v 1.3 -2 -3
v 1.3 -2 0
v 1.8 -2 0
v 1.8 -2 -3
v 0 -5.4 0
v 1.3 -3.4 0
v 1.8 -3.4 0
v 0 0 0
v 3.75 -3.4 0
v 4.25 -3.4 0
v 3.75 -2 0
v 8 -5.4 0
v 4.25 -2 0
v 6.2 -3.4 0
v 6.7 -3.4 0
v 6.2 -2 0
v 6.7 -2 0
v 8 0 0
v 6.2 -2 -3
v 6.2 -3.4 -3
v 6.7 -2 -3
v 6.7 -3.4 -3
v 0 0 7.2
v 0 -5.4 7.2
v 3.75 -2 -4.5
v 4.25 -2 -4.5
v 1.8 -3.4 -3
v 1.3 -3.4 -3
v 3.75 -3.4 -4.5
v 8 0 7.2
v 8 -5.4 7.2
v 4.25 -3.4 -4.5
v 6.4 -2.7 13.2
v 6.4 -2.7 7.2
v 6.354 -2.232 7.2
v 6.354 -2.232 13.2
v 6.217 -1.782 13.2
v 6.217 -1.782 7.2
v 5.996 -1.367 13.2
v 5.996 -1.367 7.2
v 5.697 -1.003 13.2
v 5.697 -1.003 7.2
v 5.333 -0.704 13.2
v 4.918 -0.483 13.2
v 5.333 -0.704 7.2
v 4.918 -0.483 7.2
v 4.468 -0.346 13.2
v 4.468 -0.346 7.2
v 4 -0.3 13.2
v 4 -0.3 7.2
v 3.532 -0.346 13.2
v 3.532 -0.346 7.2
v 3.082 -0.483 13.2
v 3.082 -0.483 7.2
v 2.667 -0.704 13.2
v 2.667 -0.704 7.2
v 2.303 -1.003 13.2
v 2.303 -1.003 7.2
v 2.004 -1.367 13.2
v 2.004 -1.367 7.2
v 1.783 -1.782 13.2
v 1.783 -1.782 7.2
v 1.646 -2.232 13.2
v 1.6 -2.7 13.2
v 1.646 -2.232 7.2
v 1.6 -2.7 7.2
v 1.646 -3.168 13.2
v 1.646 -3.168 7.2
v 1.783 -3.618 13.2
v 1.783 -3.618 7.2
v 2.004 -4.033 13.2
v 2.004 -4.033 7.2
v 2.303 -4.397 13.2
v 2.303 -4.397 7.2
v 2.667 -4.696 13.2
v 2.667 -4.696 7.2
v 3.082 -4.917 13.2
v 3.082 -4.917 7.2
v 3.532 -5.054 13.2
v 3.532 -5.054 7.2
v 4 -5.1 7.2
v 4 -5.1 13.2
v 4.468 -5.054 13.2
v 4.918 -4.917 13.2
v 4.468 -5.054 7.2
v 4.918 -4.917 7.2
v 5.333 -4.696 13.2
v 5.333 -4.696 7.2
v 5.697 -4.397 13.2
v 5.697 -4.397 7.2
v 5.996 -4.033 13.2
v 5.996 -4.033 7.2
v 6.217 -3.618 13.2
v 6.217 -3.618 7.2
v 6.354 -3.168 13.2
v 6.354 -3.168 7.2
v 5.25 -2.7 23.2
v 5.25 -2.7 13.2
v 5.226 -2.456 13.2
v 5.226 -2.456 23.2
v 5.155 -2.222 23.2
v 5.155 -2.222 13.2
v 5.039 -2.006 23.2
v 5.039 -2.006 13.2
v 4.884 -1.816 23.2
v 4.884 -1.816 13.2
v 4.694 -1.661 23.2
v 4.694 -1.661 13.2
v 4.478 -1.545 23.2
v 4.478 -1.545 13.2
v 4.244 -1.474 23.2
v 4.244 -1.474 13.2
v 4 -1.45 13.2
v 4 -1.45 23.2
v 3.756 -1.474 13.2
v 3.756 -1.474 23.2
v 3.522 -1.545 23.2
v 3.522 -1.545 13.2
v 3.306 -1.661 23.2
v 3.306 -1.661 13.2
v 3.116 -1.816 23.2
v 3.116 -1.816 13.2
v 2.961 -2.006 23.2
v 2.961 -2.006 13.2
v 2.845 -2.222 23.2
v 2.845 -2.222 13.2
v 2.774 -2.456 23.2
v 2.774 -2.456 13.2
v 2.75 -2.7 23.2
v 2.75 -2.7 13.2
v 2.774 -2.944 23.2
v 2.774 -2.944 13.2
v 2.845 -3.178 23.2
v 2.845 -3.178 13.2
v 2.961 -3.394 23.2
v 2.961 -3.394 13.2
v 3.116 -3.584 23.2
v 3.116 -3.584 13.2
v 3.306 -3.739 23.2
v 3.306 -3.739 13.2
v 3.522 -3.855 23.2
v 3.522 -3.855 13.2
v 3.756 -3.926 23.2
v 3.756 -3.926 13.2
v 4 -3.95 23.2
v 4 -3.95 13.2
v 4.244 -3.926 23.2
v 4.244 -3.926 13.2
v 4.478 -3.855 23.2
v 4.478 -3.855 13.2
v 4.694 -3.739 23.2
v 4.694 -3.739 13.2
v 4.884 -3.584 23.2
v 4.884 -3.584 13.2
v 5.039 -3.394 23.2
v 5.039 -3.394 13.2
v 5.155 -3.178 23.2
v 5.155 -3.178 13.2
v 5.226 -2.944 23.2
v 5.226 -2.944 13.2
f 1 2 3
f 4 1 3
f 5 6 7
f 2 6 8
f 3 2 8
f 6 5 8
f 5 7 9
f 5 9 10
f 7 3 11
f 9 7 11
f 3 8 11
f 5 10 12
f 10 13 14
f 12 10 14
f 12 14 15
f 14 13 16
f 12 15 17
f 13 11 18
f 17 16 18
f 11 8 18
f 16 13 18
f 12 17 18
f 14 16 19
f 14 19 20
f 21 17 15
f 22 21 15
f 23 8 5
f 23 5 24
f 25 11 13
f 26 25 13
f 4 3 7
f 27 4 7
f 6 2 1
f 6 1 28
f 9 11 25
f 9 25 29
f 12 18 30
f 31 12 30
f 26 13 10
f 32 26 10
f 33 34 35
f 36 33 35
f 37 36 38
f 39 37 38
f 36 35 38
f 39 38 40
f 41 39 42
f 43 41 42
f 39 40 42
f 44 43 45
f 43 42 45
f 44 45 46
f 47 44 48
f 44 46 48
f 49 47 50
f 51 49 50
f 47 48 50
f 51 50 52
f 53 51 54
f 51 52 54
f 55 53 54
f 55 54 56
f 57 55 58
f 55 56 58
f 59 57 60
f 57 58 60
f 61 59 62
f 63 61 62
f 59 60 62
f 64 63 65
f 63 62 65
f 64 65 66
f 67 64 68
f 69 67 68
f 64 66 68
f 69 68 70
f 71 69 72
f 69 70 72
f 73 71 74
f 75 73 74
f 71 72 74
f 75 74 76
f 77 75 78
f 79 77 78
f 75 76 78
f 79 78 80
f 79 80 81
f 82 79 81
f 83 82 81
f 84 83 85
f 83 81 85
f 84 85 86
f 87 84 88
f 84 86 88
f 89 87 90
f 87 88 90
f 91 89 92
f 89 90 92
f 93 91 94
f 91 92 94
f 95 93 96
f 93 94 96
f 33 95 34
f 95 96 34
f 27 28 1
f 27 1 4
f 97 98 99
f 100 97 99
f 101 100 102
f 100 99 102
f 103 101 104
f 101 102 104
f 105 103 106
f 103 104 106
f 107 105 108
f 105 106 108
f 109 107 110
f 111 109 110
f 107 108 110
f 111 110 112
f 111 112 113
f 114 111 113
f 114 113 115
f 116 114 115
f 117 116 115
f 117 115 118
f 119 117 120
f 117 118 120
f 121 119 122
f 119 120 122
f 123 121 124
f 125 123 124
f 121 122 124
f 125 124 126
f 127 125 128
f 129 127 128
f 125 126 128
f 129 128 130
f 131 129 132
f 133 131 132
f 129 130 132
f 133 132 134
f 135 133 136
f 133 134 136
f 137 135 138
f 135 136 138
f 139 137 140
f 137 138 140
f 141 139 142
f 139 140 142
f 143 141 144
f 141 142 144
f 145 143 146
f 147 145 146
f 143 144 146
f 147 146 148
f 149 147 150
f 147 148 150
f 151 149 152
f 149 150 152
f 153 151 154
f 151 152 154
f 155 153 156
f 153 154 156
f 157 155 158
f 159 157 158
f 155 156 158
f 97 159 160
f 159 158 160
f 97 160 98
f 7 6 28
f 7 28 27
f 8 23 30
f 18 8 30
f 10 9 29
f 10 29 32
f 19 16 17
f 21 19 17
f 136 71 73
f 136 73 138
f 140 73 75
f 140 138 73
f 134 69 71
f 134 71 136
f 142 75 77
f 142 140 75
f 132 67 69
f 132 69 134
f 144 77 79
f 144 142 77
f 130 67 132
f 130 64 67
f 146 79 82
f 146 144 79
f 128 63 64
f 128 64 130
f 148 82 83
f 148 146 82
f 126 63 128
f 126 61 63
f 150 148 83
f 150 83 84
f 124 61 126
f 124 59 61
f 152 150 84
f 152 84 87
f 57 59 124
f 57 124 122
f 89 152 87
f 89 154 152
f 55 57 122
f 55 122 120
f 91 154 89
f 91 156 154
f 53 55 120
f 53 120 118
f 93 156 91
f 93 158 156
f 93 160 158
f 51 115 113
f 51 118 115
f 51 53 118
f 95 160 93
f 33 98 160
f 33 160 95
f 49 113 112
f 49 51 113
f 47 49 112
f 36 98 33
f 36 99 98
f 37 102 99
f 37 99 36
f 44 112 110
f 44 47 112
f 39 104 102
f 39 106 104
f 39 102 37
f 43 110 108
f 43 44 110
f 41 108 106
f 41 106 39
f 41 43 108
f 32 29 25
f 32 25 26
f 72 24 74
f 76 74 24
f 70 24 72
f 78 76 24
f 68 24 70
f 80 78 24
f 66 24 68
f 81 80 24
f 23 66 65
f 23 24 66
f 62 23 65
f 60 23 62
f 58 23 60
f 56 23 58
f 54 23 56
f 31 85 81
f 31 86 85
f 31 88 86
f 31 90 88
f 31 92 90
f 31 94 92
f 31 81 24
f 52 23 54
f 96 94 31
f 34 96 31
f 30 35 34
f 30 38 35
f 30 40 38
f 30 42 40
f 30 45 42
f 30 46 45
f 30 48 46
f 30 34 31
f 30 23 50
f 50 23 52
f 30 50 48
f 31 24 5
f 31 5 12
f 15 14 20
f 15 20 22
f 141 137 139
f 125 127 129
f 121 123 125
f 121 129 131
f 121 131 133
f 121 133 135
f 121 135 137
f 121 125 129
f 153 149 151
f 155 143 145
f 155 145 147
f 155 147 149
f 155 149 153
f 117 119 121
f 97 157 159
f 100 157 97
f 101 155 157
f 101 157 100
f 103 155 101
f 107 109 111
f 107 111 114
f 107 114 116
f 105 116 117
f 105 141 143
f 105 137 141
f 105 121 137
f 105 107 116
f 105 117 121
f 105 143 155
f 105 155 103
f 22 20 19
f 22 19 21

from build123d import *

# Parameters (mm, degrees)
F0_W     = 8
F0_H     = 7.2
F1_DEPTH = 5.4
F2_R     = 2.4
F3_DEPTH = 6
F4_R     = 1.25
F5_DEPTH = 10
F6_W     = 0.5
F6_H     = 1.4
F7_DEPTH = 3
F8_W     = 0.5
F8_H     = 1.4
F9_DEPTH = 4.5


with BuildPart() as f1:
    # F0 (on Front) → F1 (new body)
    with BuildSketch(Plane.XZ):
        with Locations((4, 3.6)):
            Rectangle(F0_W, F0_H)
    extrude(amount=F1_DEPTH)

    # F2 (on face) → F3 (join)
    with BuildSketch(Plane.XY.offset(7.2)):
        with Locations((4, -2.7)):
            Circle(F2_R)
    extrude(amount=F3_DEPTH)

    # F4 (on face) → F5 (join)
    with BuildSketch(Plane.XY.offset(13.2)):
        with Locations((4, -2.7)):
            Circle(F4_R)
    extrude(amount=F5_DEPTH)

    # F6 (on face) → F7 (join)
    with BuildSketch(Plane(origin=(0, 0, 0), x_dir=(1, 0, 0), z_dir=(0, 0, -1))):
        with Locations((1.55, 2.7)):
            Rectangle(F6_W, F6_H)
        with Locations((6.45, 2.7)):
            Rectangle(F6_W, F6_H)
    extrude(amount=F7_DEPTH)

    # F8 (on face) → F9 (join)
    with BuildSketch(Plane(origin=(0, 0, 0), x_dir=(1, 0, 0), z_dir=(0, 0, -1))):
        with Locations((4, 2.7)):
            Rectangle(F8_W, F8_H)
    extrude(amount=F9_DEPTH)


solid = f1.part
